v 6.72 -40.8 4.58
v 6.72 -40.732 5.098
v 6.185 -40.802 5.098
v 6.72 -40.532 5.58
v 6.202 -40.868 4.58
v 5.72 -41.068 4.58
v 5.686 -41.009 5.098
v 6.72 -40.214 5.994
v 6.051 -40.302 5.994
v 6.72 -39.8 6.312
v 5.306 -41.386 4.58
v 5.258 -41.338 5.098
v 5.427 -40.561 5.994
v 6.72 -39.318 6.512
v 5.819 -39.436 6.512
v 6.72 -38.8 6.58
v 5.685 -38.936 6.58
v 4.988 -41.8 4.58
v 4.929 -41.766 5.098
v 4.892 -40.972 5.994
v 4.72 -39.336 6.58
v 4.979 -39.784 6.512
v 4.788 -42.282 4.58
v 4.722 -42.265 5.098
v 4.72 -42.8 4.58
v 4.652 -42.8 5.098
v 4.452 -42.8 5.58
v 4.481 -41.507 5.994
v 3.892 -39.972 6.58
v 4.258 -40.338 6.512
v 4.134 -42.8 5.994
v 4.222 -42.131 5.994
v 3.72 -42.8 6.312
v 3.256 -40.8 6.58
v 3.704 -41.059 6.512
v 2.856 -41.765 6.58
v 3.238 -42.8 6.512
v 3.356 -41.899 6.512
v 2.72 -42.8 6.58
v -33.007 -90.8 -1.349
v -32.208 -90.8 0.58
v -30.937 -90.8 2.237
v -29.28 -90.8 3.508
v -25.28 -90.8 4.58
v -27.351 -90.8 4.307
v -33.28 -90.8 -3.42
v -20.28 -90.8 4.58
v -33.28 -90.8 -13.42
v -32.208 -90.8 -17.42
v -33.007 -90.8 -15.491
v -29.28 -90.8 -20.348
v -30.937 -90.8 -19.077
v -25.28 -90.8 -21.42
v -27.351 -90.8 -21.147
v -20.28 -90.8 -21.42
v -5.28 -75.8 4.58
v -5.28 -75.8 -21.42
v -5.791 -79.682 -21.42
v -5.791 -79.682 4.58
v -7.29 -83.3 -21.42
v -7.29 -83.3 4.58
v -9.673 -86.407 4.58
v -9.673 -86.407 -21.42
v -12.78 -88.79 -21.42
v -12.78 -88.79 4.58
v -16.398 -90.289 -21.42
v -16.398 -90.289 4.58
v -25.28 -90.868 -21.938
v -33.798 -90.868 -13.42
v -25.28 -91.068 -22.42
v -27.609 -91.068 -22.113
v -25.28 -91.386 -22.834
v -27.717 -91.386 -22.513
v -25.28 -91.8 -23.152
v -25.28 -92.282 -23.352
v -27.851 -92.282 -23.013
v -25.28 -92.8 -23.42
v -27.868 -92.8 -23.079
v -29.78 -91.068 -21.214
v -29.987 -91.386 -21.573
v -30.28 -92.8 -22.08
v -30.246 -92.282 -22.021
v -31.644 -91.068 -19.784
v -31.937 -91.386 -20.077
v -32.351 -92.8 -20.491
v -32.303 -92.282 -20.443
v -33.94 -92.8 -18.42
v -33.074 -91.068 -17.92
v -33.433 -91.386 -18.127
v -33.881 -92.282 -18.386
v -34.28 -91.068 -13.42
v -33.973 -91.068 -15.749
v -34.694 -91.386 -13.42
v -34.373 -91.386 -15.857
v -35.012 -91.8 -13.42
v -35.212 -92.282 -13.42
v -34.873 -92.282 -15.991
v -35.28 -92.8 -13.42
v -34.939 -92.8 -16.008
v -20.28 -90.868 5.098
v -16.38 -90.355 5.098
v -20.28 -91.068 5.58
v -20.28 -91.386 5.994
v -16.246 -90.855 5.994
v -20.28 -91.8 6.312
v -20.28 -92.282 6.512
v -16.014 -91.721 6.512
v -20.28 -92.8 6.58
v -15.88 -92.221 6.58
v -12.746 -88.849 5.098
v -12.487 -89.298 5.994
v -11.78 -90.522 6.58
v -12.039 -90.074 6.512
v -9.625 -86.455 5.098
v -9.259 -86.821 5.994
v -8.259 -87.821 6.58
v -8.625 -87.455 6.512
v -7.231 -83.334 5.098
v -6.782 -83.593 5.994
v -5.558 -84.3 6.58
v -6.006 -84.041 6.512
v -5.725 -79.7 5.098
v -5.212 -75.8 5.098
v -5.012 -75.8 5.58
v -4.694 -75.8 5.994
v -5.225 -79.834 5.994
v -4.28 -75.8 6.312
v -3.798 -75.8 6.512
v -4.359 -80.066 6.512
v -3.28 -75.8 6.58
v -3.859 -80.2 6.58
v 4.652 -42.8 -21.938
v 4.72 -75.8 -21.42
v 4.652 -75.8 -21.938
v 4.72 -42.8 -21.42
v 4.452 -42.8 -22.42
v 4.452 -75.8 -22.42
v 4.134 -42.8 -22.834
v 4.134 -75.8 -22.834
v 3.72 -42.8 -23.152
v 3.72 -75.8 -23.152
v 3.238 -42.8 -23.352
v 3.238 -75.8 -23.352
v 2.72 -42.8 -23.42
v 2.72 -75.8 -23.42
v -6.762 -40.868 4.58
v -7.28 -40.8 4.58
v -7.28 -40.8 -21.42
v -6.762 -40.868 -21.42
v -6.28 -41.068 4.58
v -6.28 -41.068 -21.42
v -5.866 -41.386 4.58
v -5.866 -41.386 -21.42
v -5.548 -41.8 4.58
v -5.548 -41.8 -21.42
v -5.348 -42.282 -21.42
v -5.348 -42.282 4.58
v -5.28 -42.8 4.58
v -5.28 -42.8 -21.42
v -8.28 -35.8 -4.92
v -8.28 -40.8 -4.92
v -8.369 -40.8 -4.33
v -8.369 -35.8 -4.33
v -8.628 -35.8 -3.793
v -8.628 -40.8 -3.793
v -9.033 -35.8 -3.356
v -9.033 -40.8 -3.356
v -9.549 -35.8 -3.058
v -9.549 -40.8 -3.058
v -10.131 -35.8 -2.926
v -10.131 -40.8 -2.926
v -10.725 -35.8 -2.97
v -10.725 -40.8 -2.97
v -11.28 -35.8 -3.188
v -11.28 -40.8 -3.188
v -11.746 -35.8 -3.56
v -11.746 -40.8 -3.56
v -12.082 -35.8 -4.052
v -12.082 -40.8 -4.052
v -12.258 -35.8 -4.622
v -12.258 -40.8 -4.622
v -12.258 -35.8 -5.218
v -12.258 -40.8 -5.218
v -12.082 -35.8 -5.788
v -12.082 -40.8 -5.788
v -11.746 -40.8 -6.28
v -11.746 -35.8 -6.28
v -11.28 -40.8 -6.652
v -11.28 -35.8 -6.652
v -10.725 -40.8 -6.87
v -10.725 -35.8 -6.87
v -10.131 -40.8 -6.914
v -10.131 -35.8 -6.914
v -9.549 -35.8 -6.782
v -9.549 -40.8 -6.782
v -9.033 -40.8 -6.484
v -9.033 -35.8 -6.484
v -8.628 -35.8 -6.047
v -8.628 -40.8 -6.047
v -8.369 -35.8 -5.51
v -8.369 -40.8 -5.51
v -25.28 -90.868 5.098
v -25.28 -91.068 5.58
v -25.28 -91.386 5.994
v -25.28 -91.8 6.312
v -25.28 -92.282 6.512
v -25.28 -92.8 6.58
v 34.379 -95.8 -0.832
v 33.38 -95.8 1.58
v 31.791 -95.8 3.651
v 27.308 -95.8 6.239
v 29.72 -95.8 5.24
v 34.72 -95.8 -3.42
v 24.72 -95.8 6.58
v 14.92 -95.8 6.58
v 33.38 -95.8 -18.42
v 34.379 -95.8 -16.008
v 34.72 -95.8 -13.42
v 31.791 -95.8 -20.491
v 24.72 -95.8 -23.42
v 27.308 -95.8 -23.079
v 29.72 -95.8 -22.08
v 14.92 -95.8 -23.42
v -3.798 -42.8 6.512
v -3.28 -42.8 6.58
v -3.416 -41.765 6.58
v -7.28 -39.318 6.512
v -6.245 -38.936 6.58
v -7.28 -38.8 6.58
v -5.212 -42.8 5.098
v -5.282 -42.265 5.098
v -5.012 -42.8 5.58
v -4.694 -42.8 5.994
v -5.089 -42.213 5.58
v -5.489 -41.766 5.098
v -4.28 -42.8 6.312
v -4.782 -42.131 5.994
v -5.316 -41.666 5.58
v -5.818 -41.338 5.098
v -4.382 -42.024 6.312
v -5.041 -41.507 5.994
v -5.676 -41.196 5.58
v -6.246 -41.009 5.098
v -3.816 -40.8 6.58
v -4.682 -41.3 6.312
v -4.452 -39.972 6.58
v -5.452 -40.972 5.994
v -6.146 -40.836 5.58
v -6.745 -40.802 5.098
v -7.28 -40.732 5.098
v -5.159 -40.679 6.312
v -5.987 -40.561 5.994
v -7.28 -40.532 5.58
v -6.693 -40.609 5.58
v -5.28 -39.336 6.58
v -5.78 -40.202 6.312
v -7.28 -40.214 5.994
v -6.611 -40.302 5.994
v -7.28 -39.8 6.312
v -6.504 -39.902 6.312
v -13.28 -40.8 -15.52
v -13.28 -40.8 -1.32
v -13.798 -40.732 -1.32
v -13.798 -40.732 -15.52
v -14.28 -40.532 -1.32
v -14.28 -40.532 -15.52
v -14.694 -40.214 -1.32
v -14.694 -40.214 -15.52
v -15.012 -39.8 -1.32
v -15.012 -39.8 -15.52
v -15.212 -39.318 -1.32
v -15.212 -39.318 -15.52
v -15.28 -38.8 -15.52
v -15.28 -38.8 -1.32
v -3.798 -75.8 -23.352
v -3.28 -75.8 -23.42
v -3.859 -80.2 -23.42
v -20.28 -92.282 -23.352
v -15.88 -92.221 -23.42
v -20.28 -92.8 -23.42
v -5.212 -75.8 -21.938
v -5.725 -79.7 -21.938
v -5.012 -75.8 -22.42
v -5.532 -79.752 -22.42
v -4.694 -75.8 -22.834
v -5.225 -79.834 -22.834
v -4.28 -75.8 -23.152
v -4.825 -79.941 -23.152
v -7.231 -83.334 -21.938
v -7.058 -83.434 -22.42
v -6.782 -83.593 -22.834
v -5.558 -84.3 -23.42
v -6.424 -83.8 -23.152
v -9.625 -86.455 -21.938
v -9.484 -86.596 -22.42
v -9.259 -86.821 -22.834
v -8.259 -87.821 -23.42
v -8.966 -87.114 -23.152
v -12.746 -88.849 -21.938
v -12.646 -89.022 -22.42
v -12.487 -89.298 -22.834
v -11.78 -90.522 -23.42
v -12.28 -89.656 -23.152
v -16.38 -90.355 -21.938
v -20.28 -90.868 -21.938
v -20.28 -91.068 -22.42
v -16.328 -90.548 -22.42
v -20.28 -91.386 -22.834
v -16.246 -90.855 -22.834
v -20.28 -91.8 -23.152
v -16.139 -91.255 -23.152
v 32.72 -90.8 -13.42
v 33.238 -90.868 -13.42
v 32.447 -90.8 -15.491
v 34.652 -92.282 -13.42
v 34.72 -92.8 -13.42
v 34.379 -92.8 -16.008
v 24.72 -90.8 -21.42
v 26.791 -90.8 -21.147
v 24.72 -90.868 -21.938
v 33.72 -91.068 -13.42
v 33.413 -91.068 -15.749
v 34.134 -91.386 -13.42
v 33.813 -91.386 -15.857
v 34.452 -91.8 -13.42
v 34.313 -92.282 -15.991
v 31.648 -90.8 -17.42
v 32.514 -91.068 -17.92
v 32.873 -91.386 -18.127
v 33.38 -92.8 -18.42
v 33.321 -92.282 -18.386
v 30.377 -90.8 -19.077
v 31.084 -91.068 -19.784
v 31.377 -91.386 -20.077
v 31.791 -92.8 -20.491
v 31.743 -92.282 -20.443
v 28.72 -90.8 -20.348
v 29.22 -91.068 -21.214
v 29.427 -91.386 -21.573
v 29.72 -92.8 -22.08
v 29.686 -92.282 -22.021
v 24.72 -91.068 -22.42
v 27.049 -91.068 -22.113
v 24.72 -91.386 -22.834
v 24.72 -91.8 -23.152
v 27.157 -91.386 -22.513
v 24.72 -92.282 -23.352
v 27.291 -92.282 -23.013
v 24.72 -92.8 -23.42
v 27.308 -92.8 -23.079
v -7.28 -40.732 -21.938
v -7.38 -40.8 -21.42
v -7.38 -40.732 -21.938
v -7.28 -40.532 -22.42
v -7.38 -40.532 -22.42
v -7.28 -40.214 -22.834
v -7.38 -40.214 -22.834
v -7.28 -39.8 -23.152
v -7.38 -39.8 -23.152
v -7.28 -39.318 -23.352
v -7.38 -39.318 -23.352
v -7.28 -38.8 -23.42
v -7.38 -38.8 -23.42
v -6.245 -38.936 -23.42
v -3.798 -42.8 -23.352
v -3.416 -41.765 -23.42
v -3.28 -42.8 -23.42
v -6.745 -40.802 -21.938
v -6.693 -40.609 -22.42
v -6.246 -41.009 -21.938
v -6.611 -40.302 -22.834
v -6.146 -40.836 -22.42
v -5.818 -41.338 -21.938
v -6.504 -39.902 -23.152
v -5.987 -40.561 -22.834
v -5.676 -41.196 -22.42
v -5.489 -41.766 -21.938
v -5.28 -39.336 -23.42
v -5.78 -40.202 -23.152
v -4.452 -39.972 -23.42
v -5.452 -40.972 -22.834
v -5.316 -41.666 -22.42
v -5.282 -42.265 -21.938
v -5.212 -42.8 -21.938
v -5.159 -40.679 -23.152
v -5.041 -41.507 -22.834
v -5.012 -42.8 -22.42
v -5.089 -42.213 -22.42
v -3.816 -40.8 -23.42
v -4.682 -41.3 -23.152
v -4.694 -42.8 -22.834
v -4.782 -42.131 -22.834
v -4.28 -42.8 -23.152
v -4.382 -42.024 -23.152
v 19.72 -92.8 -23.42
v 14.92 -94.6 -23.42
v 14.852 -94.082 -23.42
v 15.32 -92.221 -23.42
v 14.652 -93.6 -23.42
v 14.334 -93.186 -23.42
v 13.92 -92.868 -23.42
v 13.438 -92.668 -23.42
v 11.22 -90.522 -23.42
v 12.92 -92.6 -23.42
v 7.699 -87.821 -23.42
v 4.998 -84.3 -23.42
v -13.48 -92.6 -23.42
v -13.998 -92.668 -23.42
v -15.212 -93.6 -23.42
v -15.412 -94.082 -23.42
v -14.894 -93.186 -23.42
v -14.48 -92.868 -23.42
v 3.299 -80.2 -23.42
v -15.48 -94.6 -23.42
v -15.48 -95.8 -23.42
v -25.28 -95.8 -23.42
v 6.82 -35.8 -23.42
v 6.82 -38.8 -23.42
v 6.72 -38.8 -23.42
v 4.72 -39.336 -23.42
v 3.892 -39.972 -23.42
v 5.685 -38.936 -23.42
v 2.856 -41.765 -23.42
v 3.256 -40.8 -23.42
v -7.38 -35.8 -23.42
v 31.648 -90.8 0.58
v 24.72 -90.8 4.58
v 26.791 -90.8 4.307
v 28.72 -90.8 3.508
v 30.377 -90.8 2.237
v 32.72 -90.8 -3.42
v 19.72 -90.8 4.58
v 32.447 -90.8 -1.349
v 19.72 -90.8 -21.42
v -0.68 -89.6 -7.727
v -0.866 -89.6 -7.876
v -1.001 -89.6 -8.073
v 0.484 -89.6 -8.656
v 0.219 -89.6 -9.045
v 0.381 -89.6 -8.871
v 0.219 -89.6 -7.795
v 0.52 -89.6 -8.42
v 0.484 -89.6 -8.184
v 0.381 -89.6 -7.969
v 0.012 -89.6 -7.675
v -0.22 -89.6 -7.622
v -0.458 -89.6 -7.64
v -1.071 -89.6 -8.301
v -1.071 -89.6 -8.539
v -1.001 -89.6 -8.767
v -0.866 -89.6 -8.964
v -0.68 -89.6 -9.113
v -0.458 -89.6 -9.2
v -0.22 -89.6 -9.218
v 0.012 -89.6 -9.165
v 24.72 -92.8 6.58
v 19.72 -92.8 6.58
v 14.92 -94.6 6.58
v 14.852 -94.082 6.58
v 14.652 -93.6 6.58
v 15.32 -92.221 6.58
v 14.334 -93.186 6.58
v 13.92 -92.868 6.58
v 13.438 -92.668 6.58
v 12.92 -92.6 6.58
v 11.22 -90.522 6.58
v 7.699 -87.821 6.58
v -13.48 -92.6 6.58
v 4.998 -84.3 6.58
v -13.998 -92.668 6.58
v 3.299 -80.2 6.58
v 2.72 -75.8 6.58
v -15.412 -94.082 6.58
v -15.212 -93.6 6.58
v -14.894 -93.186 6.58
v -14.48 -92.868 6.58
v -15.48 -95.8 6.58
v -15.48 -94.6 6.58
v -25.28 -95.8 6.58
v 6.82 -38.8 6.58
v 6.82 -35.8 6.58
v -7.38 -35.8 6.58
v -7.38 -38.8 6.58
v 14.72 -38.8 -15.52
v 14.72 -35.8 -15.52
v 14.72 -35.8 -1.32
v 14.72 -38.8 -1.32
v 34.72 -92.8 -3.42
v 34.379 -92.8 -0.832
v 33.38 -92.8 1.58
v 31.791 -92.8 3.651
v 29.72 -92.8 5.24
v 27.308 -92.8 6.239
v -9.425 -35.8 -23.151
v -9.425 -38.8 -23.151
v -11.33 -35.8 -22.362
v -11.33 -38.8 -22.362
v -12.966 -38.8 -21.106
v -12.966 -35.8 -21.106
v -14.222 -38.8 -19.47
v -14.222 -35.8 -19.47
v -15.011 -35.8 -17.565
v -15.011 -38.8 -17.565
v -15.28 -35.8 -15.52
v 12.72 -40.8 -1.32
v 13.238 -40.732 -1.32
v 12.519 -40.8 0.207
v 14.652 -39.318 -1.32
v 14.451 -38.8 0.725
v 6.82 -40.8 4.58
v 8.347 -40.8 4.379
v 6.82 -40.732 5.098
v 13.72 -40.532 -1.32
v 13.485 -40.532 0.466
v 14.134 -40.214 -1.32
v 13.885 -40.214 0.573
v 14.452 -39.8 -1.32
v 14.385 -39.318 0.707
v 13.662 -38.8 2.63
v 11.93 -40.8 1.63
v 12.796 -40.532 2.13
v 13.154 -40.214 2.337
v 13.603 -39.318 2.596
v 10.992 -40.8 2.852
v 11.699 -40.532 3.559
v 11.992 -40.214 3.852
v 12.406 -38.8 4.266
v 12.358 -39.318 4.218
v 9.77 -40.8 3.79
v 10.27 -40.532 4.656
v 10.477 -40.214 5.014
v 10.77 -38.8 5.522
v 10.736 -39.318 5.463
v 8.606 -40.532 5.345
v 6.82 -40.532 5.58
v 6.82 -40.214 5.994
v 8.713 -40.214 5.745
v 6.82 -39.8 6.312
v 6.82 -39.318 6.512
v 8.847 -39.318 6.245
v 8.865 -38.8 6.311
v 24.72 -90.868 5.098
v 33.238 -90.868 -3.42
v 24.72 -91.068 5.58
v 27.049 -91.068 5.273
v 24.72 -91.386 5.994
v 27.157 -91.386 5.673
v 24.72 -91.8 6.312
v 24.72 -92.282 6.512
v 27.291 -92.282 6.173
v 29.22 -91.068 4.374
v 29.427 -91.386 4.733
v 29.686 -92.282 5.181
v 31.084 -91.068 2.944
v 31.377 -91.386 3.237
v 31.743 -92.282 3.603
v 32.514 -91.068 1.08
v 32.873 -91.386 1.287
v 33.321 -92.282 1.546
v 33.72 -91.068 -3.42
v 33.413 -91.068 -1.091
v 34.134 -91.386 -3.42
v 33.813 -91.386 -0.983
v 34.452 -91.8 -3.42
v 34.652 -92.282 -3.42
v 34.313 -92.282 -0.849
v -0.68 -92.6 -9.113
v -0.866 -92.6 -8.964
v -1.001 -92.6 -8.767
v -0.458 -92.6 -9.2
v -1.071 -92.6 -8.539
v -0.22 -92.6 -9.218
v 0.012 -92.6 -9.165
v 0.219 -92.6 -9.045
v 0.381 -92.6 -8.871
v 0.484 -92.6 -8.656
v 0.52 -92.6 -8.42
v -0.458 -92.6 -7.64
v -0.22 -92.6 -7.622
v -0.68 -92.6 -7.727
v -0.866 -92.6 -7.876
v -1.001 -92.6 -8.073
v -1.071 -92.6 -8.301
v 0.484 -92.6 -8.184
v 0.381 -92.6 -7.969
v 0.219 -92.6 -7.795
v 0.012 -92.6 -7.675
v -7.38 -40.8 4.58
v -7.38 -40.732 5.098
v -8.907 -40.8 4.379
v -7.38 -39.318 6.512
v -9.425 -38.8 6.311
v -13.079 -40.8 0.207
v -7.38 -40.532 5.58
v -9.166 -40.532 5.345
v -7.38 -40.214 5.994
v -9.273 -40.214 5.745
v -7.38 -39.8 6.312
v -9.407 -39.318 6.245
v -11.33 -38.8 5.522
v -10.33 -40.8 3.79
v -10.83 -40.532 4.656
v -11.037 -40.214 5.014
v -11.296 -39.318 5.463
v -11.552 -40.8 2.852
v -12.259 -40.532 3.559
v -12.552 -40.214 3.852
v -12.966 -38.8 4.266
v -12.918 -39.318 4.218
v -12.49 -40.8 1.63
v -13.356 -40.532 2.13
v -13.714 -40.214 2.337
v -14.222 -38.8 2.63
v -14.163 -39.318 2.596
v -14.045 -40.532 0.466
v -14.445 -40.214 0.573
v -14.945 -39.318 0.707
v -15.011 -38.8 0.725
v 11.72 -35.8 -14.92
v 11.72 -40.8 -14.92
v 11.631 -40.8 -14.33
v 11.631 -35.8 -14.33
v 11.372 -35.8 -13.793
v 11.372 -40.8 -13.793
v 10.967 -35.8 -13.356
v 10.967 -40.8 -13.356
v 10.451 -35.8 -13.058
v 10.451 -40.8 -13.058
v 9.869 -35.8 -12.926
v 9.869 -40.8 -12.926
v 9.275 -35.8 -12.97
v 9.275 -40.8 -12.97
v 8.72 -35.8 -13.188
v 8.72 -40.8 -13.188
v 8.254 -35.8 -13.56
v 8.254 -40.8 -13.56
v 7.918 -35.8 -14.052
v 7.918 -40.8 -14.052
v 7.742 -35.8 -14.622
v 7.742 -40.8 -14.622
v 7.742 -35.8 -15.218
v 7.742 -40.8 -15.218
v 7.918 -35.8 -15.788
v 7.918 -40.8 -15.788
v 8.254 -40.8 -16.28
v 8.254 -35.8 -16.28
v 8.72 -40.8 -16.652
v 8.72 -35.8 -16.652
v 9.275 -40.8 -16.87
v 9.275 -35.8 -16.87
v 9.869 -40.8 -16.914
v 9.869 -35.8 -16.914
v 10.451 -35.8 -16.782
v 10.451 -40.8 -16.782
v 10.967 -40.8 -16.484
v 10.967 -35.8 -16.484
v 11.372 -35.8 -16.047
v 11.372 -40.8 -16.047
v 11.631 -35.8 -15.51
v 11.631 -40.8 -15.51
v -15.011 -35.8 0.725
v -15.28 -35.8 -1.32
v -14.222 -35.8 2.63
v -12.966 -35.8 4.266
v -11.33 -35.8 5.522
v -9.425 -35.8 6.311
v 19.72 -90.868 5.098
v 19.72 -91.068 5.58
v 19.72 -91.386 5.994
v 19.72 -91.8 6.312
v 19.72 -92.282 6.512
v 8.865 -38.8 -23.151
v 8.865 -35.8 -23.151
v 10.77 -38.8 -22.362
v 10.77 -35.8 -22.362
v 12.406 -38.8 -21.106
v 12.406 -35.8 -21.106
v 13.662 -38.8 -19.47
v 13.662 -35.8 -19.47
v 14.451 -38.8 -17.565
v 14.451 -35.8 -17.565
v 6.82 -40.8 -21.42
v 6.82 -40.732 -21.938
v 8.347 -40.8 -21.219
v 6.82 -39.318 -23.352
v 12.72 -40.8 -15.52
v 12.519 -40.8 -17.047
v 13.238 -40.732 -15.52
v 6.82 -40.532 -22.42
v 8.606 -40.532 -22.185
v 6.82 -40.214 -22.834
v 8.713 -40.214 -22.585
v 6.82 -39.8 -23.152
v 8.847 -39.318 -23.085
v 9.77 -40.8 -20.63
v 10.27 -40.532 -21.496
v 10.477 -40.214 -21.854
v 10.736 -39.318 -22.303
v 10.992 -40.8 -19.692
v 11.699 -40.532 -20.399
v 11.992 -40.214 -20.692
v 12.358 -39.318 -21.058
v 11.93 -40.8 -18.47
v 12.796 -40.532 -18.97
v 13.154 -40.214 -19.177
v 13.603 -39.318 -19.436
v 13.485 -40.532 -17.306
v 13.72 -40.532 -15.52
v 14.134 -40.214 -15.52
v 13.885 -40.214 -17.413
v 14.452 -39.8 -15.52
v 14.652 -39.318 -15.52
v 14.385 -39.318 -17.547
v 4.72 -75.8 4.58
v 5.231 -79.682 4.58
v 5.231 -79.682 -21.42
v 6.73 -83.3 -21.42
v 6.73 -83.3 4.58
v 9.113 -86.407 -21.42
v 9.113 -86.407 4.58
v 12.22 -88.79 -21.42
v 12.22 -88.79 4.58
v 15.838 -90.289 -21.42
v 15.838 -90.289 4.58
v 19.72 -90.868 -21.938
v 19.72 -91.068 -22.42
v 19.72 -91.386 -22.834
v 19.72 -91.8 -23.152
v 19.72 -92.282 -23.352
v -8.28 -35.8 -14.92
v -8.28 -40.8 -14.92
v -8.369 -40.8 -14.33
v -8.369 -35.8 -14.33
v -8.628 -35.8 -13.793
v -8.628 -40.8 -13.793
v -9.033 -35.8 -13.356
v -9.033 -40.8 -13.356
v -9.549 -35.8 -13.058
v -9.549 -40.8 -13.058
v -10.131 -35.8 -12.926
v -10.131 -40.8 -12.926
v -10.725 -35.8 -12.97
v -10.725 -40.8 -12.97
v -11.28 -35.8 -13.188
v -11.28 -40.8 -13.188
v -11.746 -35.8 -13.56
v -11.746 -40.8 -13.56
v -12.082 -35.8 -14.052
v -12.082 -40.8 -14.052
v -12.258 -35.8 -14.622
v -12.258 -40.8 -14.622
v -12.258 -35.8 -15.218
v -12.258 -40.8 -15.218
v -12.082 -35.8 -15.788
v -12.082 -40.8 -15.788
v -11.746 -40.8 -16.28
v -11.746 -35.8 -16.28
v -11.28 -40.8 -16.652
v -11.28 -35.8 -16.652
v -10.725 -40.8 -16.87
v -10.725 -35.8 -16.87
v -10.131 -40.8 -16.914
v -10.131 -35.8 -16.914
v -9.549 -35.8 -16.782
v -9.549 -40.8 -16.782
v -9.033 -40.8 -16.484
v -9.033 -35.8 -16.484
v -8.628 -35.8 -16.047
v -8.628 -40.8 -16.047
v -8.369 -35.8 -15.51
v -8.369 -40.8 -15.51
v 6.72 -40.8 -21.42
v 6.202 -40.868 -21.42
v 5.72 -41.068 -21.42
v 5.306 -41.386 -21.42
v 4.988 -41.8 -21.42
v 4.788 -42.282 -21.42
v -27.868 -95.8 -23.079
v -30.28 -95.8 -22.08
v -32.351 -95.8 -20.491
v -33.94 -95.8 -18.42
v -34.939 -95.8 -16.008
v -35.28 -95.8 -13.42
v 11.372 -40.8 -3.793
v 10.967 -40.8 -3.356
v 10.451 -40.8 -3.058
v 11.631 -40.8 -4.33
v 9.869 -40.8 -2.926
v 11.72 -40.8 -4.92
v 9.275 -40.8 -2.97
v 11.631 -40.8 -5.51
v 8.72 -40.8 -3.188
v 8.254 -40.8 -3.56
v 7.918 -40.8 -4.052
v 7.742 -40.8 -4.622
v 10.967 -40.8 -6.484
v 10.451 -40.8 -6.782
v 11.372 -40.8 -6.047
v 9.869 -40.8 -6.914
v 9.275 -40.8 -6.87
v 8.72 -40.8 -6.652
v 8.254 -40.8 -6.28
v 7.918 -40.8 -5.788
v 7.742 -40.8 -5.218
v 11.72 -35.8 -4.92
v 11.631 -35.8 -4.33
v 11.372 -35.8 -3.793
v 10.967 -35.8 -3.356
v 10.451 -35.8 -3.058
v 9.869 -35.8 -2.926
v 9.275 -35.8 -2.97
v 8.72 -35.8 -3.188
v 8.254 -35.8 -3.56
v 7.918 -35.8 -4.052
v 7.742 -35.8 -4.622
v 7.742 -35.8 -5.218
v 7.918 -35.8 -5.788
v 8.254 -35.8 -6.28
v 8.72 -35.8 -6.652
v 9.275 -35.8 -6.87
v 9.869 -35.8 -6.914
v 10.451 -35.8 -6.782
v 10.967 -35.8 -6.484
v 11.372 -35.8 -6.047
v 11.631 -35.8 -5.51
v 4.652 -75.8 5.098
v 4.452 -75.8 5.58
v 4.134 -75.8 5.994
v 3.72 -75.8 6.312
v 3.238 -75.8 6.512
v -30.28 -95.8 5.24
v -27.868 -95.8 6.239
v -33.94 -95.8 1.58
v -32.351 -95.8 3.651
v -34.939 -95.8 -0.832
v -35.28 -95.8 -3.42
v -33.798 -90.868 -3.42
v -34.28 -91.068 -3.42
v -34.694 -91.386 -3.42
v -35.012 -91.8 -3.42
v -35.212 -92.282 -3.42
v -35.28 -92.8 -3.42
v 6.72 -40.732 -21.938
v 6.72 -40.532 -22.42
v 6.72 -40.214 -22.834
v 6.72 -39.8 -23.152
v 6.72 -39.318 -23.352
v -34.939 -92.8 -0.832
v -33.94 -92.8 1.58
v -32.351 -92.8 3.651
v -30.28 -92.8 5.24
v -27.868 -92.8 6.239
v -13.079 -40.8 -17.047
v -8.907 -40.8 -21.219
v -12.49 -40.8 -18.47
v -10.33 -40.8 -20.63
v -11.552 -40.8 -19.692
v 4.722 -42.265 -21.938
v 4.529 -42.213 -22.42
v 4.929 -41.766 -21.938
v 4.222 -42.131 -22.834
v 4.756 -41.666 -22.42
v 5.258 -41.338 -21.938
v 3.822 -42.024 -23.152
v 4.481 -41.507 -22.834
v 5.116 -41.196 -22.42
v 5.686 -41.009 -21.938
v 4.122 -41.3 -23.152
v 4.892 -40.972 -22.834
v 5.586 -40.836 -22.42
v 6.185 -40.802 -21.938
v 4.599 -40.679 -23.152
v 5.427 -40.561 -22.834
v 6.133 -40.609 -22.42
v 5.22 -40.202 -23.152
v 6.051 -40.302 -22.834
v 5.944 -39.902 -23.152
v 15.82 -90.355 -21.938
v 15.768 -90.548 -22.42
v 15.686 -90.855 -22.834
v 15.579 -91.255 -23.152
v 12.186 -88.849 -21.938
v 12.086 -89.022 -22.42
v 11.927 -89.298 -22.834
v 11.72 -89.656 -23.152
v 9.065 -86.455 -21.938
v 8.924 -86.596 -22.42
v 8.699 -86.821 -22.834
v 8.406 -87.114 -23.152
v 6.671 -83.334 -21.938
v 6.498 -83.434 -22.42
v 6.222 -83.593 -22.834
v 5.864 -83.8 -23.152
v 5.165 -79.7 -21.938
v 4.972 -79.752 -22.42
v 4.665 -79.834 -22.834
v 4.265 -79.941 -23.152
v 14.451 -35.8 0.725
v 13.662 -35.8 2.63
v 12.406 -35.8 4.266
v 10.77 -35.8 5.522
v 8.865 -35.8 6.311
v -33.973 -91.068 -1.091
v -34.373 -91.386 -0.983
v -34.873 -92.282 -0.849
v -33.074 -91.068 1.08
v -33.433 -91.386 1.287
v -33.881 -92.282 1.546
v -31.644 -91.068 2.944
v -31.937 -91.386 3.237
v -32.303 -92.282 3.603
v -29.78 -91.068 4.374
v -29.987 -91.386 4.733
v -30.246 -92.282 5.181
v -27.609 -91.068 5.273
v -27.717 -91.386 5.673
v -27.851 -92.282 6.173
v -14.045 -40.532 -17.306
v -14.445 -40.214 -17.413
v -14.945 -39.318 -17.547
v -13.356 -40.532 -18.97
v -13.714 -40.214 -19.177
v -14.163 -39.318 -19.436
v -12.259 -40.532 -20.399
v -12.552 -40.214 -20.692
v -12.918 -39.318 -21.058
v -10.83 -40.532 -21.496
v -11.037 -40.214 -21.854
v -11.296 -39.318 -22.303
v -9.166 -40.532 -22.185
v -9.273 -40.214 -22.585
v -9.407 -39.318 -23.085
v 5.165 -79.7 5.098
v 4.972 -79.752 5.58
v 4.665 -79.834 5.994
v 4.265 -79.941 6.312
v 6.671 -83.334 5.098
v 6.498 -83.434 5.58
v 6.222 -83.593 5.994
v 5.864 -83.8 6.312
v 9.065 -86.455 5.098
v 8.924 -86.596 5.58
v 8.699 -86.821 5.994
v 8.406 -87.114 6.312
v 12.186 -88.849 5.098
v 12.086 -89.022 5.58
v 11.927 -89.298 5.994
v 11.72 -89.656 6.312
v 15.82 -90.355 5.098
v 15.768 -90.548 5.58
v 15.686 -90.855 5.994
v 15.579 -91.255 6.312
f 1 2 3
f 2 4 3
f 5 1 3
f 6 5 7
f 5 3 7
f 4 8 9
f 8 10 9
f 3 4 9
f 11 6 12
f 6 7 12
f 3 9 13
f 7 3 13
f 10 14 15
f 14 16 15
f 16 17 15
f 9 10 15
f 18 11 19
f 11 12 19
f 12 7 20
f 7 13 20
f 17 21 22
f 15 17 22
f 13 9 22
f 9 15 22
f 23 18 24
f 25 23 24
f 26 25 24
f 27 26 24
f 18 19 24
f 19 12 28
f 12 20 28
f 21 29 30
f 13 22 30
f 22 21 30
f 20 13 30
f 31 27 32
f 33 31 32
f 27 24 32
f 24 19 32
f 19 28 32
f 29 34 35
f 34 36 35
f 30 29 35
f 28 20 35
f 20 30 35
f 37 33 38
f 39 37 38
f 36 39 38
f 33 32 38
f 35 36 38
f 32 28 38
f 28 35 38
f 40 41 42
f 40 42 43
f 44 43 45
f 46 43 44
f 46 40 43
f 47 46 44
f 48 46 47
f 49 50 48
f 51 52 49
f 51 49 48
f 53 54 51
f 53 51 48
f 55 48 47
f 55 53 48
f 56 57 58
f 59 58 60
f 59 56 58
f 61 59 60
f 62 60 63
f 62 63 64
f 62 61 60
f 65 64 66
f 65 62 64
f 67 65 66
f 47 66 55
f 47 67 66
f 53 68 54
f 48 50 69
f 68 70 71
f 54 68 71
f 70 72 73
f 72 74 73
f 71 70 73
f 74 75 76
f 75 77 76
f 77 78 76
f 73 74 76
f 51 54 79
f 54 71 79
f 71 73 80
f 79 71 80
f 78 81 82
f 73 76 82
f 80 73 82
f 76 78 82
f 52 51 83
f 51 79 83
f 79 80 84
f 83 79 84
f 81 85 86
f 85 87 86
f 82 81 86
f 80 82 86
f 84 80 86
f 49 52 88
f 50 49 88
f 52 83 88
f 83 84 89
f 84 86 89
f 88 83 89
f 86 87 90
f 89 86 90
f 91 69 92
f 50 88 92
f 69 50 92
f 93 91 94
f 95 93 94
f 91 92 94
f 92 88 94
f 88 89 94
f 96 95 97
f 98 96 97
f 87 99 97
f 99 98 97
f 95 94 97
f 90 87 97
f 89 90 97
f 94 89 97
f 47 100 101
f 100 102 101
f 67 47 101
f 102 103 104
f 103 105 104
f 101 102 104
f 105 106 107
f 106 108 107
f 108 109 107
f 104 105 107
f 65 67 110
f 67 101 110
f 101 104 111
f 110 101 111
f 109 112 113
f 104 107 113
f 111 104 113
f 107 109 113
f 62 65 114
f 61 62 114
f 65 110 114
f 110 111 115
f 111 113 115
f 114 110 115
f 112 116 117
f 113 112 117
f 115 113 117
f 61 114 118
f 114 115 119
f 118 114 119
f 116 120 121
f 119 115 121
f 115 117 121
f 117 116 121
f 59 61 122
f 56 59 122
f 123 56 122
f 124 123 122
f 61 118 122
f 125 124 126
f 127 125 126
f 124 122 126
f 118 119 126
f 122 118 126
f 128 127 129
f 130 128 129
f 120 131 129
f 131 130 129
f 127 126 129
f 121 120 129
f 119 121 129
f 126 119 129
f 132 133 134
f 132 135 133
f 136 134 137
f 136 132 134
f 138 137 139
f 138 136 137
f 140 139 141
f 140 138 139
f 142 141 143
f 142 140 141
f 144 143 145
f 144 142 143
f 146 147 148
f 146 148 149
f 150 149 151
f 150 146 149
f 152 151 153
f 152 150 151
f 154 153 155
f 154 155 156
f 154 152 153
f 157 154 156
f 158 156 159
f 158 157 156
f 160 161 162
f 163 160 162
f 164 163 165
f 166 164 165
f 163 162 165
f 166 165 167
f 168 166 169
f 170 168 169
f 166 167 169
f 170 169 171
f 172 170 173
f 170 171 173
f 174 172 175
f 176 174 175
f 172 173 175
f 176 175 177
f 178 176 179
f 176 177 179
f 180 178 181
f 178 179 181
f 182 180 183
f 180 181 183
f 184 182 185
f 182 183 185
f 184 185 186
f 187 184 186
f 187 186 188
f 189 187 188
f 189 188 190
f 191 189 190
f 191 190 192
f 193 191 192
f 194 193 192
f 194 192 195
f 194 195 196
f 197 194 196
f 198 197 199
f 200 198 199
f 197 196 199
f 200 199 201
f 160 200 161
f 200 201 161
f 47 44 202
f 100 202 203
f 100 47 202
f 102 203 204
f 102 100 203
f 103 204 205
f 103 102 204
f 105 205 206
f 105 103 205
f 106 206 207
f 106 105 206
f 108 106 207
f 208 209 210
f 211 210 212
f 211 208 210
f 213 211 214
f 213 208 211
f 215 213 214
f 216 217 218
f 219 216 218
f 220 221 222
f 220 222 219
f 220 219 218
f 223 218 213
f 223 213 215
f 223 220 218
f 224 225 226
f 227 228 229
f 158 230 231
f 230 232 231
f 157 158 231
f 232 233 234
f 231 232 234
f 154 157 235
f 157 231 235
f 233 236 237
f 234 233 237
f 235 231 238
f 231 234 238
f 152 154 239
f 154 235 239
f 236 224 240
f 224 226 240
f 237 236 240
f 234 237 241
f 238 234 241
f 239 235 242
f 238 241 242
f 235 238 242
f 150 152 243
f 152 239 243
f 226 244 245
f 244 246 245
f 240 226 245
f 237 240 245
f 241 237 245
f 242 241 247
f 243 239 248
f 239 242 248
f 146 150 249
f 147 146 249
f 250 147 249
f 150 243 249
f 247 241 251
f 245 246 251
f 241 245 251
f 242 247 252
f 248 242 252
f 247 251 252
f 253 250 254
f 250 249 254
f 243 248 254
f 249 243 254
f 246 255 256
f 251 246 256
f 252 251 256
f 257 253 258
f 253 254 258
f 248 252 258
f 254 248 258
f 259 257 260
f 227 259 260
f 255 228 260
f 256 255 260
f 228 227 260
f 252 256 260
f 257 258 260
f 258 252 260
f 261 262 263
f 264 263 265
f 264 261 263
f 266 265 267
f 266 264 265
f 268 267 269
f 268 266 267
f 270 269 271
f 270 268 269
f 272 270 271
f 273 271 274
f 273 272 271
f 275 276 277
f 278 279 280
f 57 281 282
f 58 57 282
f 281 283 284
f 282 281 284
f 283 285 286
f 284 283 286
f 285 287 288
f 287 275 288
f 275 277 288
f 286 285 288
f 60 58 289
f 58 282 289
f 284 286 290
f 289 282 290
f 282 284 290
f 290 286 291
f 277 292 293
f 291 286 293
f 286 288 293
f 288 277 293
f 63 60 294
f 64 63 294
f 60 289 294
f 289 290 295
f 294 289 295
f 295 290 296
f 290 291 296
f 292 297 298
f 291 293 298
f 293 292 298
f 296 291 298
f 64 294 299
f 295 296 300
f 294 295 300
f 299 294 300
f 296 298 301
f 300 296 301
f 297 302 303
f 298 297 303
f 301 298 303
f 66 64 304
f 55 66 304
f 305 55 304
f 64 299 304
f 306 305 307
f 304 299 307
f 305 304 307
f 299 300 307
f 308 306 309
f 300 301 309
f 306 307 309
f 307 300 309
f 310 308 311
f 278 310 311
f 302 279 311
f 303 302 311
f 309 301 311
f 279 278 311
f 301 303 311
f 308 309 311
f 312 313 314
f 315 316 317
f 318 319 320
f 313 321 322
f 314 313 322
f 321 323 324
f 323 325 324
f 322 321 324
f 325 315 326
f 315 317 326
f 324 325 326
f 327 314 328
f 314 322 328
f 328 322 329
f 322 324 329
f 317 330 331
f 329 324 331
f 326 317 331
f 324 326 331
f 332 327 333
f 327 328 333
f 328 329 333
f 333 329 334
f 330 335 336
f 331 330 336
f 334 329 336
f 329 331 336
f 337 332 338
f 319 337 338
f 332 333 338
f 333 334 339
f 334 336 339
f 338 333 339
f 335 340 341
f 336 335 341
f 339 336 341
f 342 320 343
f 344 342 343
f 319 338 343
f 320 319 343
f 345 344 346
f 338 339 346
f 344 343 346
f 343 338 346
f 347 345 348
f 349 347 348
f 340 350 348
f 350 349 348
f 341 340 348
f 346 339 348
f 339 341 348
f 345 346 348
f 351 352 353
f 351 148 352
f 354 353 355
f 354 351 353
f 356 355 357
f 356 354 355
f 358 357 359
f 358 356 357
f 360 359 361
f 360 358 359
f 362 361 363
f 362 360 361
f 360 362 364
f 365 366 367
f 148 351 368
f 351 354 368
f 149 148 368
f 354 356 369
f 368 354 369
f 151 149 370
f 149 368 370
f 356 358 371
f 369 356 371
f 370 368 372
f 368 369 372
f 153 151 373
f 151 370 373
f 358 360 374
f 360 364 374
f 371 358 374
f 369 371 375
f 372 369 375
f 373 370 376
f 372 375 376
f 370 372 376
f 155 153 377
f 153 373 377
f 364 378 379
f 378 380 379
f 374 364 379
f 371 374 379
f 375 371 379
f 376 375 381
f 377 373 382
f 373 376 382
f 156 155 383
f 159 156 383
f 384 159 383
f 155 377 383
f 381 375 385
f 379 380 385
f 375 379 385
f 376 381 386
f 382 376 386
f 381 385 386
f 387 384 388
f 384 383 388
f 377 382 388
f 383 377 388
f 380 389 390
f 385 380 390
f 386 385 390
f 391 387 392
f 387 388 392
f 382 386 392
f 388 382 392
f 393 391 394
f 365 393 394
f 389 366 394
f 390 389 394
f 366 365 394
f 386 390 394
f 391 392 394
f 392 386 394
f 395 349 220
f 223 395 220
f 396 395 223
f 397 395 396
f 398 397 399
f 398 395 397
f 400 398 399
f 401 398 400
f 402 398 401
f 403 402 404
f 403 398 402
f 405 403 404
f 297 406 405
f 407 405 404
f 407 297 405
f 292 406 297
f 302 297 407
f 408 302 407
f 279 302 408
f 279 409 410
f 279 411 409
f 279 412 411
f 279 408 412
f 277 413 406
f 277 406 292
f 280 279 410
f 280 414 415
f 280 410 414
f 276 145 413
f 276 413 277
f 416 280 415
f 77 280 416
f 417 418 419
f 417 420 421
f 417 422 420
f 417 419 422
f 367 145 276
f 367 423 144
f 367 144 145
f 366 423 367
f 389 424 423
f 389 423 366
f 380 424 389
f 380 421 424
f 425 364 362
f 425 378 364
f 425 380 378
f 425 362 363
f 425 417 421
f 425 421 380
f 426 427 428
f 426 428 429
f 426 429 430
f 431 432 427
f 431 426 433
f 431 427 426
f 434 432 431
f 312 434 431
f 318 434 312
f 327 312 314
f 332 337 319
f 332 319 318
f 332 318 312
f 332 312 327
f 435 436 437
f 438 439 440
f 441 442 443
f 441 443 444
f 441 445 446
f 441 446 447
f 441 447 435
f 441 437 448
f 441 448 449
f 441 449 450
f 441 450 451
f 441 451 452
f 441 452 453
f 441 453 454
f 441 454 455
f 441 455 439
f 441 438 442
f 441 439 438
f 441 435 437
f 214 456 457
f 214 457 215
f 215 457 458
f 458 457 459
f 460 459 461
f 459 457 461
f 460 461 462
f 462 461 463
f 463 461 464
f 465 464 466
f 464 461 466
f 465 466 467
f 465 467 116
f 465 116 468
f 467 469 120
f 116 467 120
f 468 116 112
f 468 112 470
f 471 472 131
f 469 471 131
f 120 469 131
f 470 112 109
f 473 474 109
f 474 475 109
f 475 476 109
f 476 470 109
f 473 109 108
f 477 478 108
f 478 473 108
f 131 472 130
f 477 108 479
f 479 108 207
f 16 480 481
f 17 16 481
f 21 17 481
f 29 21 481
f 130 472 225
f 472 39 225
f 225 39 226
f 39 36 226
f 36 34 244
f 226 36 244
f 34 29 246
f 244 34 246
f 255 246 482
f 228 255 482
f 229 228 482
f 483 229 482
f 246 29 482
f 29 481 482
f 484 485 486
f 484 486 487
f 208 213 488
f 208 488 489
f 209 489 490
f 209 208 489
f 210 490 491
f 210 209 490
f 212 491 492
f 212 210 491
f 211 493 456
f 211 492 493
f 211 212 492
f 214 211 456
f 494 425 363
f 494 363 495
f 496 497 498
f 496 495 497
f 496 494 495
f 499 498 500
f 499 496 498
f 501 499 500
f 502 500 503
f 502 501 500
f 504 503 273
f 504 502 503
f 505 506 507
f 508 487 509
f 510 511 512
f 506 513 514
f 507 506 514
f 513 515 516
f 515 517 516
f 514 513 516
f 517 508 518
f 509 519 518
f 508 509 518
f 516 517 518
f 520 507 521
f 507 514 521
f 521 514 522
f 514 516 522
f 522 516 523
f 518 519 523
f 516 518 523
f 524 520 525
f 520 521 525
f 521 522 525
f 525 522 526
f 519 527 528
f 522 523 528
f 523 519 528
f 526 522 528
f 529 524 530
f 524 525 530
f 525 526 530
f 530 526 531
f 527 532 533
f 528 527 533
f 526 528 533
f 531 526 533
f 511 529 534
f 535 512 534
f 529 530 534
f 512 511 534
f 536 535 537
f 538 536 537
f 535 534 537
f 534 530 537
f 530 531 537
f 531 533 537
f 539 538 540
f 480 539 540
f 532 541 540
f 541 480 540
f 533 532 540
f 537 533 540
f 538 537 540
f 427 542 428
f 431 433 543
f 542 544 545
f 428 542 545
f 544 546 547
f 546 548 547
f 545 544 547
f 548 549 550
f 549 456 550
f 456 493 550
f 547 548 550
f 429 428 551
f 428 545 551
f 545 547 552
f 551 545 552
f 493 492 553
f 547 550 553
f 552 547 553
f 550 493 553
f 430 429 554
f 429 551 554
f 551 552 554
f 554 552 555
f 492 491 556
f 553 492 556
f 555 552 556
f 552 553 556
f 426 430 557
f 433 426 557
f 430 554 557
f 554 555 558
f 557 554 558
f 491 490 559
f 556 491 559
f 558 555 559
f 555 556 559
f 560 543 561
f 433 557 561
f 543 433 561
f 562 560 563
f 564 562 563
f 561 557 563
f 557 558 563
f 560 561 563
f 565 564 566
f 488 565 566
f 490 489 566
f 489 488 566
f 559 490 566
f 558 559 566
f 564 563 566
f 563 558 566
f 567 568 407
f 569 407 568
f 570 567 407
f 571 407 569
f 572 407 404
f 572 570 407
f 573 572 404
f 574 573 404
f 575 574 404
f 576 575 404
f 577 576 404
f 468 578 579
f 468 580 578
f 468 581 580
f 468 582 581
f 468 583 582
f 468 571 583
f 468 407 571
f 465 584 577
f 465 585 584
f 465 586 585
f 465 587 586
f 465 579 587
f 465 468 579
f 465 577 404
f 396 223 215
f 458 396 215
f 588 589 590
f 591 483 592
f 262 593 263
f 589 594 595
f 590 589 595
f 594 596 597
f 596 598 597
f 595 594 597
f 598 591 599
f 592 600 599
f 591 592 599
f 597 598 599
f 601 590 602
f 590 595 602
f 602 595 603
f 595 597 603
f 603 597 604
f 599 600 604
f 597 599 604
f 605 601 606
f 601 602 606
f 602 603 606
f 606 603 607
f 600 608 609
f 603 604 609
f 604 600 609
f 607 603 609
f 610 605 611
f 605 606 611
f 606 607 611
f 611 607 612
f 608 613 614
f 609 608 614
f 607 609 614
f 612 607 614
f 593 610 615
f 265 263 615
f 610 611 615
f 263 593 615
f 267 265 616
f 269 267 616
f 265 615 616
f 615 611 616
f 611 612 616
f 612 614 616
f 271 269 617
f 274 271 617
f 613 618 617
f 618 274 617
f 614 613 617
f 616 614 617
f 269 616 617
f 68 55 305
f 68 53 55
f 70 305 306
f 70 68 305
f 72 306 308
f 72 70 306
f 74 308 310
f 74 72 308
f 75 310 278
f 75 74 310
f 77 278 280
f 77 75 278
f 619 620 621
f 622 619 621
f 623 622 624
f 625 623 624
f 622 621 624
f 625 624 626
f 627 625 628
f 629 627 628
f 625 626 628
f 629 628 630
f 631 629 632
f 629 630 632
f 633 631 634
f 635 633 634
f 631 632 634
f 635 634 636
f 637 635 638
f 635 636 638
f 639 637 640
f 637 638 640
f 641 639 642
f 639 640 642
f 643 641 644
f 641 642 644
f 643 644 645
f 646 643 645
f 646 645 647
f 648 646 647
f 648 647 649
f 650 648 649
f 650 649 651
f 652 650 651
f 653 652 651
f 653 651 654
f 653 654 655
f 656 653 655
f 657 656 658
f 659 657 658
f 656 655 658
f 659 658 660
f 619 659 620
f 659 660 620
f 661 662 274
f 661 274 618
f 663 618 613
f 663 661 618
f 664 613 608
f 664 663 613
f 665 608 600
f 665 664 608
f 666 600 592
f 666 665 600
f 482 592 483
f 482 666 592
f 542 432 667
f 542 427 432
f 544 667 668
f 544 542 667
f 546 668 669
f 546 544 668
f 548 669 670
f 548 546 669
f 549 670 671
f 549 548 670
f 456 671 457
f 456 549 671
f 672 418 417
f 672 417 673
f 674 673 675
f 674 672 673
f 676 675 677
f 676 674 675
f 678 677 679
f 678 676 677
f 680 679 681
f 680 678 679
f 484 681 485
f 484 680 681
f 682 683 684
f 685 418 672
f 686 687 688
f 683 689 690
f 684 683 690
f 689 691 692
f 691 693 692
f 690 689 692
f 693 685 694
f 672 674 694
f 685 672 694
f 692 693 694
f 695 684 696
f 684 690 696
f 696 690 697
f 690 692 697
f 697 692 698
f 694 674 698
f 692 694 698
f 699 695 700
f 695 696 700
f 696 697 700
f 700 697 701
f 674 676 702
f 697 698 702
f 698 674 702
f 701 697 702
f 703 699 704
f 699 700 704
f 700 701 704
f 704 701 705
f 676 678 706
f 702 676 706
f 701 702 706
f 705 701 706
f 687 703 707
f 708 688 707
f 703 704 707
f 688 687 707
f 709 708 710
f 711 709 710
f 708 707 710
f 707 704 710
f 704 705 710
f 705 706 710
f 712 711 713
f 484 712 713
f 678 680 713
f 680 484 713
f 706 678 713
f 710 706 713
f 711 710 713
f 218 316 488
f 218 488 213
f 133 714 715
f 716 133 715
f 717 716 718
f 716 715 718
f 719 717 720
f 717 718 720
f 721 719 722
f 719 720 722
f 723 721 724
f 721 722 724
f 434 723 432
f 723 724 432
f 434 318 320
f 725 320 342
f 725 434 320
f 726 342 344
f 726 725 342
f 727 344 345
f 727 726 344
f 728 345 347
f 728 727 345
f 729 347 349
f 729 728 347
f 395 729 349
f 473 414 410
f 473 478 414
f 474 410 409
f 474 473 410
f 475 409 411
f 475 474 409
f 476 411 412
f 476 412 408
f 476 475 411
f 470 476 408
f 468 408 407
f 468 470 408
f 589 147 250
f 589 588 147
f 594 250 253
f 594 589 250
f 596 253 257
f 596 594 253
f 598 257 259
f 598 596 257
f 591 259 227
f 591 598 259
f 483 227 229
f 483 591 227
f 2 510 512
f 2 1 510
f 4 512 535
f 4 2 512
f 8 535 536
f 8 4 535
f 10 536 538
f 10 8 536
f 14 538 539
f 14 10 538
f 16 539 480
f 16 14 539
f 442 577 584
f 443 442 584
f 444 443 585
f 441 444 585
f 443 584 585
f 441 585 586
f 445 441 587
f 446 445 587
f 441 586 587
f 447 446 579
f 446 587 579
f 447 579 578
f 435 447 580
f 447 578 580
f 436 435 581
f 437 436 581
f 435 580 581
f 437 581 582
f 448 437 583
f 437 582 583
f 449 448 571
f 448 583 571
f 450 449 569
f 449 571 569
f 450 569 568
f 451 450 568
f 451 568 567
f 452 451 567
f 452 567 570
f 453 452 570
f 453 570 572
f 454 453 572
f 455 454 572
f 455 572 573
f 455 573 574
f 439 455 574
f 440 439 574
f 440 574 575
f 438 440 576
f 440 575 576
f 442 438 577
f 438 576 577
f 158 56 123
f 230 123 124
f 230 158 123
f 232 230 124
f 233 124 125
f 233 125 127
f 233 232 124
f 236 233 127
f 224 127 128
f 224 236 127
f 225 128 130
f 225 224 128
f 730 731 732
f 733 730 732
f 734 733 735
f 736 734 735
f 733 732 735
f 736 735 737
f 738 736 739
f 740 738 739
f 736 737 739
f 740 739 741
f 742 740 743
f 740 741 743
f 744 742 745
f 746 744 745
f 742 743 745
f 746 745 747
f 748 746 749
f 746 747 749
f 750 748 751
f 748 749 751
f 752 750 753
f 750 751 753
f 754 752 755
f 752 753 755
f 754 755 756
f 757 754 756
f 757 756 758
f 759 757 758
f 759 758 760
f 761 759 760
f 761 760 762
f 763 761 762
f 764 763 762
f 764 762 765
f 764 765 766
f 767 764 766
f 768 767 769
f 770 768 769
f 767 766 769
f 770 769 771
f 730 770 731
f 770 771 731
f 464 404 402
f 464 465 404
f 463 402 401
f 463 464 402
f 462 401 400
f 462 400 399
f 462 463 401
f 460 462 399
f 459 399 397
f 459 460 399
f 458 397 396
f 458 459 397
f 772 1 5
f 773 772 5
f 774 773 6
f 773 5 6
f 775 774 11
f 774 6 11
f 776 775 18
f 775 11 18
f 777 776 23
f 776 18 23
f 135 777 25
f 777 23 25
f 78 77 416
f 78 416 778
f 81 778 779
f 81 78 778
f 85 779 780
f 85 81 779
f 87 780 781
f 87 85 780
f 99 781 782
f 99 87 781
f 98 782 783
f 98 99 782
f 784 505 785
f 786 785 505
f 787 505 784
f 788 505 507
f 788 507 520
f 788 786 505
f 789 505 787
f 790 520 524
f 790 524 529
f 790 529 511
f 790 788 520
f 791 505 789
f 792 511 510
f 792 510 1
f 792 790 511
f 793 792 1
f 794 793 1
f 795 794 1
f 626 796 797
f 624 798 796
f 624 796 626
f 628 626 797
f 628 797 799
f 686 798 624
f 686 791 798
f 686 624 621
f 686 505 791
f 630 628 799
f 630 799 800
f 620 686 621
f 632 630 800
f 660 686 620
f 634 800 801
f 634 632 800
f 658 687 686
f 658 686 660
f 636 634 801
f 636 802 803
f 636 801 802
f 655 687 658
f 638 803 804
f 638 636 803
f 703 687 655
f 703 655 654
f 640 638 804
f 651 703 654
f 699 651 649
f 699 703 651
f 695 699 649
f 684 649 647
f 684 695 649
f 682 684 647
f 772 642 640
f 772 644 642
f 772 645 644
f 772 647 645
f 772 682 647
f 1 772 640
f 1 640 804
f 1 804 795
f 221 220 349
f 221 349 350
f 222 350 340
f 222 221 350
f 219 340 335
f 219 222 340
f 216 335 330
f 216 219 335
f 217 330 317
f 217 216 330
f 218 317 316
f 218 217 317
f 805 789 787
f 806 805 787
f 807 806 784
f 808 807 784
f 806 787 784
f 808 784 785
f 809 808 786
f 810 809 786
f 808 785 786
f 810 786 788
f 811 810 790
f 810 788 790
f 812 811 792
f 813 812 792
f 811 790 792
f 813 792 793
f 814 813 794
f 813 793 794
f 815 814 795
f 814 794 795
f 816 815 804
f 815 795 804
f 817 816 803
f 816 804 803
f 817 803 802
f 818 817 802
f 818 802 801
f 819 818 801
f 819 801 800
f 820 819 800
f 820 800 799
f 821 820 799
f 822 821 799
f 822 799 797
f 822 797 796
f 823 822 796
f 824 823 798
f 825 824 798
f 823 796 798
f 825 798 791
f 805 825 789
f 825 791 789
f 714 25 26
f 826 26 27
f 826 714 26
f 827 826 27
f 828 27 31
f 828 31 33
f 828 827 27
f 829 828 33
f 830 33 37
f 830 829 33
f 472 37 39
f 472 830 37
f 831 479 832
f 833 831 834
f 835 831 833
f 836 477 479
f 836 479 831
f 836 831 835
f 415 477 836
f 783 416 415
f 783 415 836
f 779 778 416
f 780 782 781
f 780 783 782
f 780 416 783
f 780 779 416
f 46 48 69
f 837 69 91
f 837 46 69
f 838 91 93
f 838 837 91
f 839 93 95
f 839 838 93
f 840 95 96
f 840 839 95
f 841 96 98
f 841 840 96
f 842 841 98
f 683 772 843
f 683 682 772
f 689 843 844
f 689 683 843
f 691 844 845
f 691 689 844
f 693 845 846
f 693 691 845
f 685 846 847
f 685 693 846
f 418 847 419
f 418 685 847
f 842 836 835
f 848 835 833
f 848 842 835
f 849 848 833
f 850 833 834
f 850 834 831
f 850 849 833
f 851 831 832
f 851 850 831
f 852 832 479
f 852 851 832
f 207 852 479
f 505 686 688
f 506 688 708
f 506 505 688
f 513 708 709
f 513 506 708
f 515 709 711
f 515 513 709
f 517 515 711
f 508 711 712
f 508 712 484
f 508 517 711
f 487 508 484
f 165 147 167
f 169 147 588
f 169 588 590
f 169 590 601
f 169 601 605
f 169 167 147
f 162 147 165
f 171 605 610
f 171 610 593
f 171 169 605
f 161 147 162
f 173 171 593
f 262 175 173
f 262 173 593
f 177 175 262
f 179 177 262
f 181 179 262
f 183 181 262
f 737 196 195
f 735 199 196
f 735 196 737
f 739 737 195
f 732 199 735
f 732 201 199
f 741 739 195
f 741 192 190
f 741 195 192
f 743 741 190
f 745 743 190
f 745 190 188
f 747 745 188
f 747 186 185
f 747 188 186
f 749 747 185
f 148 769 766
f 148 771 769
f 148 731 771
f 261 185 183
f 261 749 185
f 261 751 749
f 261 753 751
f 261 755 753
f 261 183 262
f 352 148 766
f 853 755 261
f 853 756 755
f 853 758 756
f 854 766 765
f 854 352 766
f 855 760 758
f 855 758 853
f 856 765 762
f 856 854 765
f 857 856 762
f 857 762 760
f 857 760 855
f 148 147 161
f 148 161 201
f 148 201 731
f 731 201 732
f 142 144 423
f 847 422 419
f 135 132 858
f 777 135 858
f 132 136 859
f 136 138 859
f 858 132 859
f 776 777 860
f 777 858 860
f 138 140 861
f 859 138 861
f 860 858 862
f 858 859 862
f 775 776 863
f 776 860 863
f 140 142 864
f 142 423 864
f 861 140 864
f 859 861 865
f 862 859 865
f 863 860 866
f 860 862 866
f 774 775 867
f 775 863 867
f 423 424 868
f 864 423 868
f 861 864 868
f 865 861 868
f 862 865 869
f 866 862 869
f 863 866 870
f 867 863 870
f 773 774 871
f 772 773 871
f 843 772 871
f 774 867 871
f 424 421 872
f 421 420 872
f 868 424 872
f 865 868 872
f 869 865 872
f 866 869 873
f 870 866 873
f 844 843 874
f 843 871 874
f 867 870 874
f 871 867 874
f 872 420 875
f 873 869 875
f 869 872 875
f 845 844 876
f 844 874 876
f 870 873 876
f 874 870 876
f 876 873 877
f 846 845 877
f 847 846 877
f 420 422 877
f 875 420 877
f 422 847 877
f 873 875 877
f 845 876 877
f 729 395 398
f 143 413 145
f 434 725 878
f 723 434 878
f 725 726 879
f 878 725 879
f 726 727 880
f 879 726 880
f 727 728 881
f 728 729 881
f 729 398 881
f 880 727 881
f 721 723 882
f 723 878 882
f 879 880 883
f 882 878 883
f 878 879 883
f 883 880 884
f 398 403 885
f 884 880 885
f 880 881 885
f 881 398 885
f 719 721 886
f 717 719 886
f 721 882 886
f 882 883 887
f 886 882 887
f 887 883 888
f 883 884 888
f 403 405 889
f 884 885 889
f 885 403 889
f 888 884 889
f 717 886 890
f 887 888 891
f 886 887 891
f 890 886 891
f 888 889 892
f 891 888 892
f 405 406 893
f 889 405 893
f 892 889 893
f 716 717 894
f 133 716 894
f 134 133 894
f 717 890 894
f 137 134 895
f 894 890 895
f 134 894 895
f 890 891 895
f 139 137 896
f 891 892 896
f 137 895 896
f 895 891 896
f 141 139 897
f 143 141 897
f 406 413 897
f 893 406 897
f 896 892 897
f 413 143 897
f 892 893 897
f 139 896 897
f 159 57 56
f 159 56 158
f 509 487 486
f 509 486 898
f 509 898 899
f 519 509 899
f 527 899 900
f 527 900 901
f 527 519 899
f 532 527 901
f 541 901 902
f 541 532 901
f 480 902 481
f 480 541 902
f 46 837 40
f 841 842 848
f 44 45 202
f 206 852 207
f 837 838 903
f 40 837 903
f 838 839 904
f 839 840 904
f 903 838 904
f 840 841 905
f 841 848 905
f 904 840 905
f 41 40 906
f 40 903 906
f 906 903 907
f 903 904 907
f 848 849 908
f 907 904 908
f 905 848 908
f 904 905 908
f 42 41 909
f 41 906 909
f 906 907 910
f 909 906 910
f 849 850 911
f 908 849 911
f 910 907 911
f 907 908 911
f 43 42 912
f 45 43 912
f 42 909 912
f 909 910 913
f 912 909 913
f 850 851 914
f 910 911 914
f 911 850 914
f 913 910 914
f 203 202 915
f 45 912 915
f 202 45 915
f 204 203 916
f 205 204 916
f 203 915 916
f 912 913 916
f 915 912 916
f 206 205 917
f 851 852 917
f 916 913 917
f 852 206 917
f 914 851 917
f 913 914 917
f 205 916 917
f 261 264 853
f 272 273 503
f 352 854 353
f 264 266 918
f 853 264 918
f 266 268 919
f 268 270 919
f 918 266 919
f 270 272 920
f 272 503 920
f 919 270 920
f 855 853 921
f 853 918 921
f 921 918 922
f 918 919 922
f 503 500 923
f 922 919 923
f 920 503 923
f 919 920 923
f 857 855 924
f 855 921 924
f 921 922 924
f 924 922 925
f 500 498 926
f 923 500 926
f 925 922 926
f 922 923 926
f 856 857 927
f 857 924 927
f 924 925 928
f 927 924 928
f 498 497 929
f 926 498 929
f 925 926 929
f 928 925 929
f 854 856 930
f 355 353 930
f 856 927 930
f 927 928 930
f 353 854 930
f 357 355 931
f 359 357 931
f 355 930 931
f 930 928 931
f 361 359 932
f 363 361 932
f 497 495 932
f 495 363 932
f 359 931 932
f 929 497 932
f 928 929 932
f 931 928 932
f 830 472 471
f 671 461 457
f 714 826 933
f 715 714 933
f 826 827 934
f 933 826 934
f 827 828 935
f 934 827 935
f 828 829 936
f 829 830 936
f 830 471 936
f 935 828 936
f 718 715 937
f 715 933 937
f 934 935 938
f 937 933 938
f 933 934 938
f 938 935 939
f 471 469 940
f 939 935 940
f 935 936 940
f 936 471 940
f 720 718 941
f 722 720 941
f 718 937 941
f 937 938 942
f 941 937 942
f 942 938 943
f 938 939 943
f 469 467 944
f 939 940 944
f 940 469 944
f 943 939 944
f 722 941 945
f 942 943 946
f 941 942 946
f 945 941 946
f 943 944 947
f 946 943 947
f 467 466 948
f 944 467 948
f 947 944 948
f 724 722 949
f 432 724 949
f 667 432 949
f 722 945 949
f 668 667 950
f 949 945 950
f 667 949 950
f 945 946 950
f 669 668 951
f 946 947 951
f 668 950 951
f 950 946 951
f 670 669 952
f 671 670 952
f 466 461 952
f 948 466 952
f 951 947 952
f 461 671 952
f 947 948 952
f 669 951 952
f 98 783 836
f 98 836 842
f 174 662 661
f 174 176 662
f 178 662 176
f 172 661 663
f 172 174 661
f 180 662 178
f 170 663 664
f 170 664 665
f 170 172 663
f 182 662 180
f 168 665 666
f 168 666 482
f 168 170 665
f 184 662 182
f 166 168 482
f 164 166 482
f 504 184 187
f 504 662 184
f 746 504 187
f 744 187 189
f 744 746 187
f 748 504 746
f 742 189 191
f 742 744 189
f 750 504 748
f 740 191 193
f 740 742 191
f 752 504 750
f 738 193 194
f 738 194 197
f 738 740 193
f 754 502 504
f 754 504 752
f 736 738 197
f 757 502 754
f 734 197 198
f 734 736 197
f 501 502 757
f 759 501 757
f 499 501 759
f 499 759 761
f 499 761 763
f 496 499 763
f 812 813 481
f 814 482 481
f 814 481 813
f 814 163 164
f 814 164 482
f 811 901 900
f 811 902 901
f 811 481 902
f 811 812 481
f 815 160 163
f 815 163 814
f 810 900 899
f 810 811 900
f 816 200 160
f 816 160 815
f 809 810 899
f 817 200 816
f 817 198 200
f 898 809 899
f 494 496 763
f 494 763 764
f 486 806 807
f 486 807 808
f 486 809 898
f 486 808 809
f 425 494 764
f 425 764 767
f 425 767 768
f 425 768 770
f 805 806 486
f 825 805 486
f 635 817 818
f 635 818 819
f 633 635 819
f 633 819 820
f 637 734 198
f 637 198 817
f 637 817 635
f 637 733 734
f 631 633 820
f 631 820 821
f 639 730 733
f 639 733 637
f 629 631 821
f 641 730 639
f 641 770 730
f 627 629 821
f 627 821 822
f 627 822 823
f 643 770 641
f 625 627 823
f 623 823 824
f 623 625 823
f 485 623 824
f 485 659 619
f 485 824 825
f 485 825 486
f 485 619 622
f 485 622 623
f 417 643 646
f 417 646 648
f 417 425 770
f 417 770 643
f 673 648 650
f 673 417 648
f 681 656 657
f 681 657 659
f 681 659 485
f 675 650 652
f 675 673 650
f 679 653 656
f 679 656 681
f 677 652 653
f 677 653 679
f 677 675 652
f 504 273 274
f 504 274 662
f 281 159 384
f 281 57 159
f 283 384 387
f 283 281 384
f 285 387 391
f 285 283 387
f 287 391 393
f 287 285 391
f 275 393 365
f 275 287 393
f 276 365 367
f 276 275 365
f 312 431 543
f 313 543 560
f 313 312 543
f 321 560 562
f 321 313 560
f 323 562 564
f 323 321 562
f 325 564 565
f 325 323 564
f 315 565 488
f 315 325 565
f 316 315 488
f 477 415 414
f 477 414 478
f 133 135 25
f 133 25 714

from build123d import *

# Parameters (mm, degrees)
PAD005_DEPTH    = 30
SKETCH014_R     = 2
POCKET016_DEPTH = 5
FILLET001_R     = 2
FILLET002_R     = 15
FILLET003_R     = 7.9
FILLET004_R     = 10
FILLET005_R     = 2
SKETCH015_W     = 30.4
SKETCH015_H     = 30
POCKET017_DEPTH = 3.2
FILLET006_R     = 2
SKETCH020_R     = 0.8
POCKET021_DEPTH = 3


with BuildPart() as part:
    # Sketch013 → Pad005 (new body)
    with BuildSketch(Plane.XY):
        Polygon((-15, 30), (15, 30), (15, 25), (5, 25), (5, -25), (35, -25), (35, -30), (-35, -30), (-35, -25), (-5, -25), (-5, 25), (-15, 25), align=None)
    extrude(amount=PAD005_DEPTH)

    # Sketch014 (on Face11 of Pad005) → Pocket016 (cut)
    with BuildSketch(Plane(origin=(0, 25, 0), x_dir=(1, 0, 0), z_dir=(0, -1, 0))):
        with Locations((-10, 18.5)):
            Circle(SKETCH014_R)
        with Locations((10, 18.5)):
            Circle(SKETCH014_R)
        with Locations((10, 8.5)):
            Circle(SKETCH014_R)
        with Locations((-10, 8.5)):
            Circle(SKETCH014_R)
    extrude(amount=-POCKET016_DEPTH, mode=Mode.SUBTRACT)

    # Fillet001
    fillet001_edges = [part.edges().sort_by_distance(p)[0] for p in [
        (-5, 25, 15),
        (5, 25, 15),
    ]]
    fillet(fillet001_edges, radius=FILLET001_R)

    # Fillet002
    fillet002_edges = [part.edges().sort_by_distance(p)[0] for p in [
        (5, -25, 15),
        (-5, -25, 15),
    ]]
    fillet(fillet002_edges, radius=FILLET002_R)

    # Fillet003
    fillet003_edges = [part.edges().sort_by_distance(p)[0] for p in [
        (15, 27.5, 30),
        (15, 27.5, 0),
        (-15, 27.5, 30),
        (-15, 27.5, 0),
    ]]
    fillet(fillet003_edges, radius=FILLET003_R)

    # Fillet004
    fillet004_edges = [part.edges().sort_by_distance(p)[0] for p in [
        (-35, -27.5, 30),
        (-35, -27.5, 0),
        (35, -27.5, 30),
        (35, -27.5, 0),
    ]]
    fillet(fillet004_edges, radius=FILLET004_R)

    # Fillet005
    fillet005_edges = [part.edges().sort_by_distance(p)[0] for p in [
        (5, 6.5, 30),
        (-5, 6.5, 30),
    ]]
    fillet(fillet005_edges, radius=FILLET005_R)

    # Sketch015 (on Face4 of Fillet005) → Pocket017 (cut)
    with BuildSketch(Plane(origin=(0, -30, 0), x_dir=(1, 0, 0), z_dir=(0, -1, 0))):
        with Locations((0, 15)):
            Rectangle(SKETCH015_W, SKETCH015_H)
    extrude(amount=-POCKET017_DEPTH, mode=Mode.SUBTRACT)

    # Fillet006
    fillet006_edges = [part.edges().sort_by_distance(p)[0] for p in [
        (15.2, -26.8, 15),
        (-15.2, -26.8, 15),
    ]]
    fillet(fillet006_edges, radius=FILLET006_R)

    # Sketch020 (on Face5 of Fillet006) → Pocket021 (cut)
    with BuildSketch(Plane(origin=(0, -26.8, 0), x_dir=(1, 0, 0), z_dir=(0, -1, 0))):
        with Locations((0, 15)):
            Circle(SKETCH020_R)
    extrude(amount=-POCKET021_DEPTH, mode=Mode.SUBTRACT)


with BuildPart() as part_1:
    # Body002 placement: moved
    add(part.part.moved(Location((-0.28, -65.8, -23.42))))


solid = part_1.part
